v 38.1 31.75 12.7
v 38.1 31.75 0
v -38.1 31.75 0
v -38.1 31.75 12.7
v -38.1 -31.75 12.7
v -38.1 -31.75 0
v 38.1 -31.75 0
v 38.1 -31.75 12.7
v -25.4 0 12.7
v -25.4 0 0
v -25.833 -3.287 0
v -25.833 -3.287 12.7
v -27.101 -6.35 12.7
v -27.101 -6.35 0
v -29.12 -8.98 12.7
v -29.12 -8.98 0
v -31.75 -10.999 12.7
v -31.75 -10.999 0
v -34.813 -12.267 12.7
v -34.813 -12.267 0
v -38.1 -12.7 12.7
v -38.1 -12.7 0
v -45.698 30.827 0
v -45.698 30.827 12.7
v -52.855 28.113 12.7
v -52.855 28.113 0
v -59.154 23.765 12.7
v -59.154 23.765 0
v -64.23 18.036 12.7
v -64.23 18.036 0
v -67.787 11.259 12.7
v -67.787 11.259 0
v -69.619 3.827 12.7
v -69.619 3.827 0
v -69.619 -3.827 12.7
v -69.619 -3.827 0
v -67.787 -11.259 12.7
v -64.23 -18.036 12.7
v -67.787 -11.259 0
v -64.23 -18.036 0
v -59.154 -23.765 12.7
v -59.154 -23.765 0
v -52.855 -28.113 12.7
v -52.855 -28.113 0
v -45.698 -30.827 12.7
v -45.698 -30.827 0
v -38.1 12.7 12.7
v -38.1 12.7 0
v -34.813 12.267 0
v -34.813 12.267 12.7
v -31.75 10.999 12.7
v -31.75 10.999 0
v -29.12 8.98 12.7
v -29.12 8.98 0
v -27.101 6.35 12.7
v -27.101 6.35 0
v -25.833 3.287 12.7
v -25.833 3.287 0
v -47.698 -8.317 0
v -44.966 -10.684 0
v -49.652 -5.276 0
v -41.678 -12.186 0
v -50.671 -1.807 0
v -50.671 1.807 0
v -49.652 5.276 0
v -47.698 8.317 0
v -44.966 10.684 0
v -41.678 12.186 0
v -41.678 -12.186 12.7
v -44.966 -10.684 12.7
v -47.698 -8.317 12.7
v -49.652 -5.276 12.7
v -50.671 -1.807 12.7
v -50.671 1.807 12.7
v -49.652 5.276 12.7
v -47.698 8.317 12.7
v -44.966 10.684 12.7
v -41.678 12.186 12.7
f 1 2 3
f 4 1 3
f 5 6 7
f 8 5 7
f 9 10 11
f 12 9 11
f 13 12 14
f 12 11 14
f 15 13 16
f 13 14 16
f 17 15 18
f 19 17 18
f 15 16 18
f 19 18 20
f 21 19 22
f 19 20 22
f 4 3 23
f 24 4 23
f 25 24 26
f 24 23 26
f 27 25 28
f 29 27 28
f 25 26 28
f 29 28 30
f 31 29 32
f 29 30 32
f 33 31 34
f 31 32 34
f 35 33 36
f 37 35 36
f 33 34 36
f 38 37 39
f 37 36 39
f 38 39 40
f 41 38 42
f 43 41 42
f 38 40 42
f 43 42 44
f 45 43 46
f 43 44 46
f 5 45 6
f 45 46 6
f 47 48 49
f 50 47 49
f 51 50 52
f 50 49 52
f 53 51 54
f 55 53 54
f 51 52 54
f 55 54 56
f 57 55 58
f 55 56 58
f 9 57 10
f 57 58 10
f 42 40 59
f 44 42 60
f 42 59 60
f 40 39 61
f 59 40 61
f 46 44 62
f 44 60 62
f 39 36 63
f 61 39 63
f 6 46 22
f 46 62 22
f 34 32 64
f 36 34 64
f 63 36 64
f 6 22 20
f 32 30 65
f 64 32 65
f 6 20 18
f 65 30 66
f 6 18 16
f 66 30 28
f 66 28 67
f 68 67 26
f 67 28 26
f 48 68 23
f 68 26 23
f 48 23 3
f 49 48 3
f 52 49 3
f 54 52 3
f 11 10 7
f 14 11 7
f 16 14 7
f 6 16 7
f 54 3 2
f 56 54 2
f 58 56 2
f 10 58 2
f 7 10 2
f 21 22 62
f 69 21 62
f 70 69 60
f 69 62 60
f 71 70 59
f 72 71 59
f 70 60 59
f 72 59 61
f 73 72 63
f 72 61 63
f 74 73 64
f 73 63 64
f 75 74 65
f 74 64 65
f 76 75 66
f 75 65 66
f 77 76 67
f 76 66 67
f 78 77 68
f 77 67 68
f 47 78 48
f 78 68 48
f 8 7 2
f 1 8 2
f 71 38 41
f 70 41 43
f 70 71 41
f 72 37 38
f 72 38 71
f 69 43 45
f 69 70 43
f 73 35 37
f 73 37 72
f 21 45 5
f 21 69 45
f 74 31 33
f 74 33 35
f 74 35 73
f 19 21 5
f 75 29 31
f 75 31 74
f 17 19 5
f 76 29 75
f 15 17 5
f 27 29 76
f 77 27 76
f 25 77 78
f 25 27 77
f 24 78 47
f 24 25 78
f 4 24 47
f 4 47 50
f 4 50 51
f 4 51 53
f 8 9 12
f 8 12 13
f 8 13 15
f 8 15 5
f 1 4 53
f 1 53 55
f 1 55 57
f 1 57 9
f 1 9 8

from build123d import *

# Parameters (mm, degrees)
F1_DEPTH = 12.7


# Not quite as in the source:
# - a feature of the source that left no trace in its solid (it failed there, or was rolled back) is left out


with BuildPart() as f1:
    # F0 (on Top) → F1 (new body)
    with BuildSketch(Plane.XY):
        with BuildLine():
            Line((-38.1, -31.75), (38.1, -31.75))
            Line((38.1, -31.75), (38.1, 31.75))
            Line((38.1, 31.75), (-38.1, 31.75))
            ThreePointArc((-38.1, 31.75), (-15.6493596973, 22.4506403027), (-6.35, 0))
            ThreePointArc((-6.35, 0), (-15.6493596973, -22.4506403027), (-38.1, -31.75))
        make_face()
        with BuildLine():
            ThreePointArc((-38.1, 31.75), (-69.85, 0), (-38.1, -31.75))
            Line((-38.1, -31.75), (-38.1, -12.7))
            ThreePointArc((-38.1, -12.7), (-50.8, 0), (-38.1, 12.7))
            Line((-38.1, 12.7), (-38.1, 31.75))
        make_face()
        with BuildLine():
            Line((-38.1, -12.7), (-38.1, -31.75))
            ThreePointArc((-38.1, -31.75), (-15.6493596973, -22.4506403027), (-6.35, 0))
            ThreePointArc((-6.35, 0), (-15.6493596973, 22.4506403027), (-38.1, 31.75))
            Line((-38.1, 31.75), (-38.1, 12.7))
            ThreePointArc((-38.1, 12.7), (-29.1197438789, 8.9802561211), (-25.4, 0))
            ThreePointArc((-25.4, 0), (-29.1197438789, -8.9802561211), (-38.1, -12.7))
        make_face()
    extrude(amount=F1_DEPTH)


solid = f1.part
